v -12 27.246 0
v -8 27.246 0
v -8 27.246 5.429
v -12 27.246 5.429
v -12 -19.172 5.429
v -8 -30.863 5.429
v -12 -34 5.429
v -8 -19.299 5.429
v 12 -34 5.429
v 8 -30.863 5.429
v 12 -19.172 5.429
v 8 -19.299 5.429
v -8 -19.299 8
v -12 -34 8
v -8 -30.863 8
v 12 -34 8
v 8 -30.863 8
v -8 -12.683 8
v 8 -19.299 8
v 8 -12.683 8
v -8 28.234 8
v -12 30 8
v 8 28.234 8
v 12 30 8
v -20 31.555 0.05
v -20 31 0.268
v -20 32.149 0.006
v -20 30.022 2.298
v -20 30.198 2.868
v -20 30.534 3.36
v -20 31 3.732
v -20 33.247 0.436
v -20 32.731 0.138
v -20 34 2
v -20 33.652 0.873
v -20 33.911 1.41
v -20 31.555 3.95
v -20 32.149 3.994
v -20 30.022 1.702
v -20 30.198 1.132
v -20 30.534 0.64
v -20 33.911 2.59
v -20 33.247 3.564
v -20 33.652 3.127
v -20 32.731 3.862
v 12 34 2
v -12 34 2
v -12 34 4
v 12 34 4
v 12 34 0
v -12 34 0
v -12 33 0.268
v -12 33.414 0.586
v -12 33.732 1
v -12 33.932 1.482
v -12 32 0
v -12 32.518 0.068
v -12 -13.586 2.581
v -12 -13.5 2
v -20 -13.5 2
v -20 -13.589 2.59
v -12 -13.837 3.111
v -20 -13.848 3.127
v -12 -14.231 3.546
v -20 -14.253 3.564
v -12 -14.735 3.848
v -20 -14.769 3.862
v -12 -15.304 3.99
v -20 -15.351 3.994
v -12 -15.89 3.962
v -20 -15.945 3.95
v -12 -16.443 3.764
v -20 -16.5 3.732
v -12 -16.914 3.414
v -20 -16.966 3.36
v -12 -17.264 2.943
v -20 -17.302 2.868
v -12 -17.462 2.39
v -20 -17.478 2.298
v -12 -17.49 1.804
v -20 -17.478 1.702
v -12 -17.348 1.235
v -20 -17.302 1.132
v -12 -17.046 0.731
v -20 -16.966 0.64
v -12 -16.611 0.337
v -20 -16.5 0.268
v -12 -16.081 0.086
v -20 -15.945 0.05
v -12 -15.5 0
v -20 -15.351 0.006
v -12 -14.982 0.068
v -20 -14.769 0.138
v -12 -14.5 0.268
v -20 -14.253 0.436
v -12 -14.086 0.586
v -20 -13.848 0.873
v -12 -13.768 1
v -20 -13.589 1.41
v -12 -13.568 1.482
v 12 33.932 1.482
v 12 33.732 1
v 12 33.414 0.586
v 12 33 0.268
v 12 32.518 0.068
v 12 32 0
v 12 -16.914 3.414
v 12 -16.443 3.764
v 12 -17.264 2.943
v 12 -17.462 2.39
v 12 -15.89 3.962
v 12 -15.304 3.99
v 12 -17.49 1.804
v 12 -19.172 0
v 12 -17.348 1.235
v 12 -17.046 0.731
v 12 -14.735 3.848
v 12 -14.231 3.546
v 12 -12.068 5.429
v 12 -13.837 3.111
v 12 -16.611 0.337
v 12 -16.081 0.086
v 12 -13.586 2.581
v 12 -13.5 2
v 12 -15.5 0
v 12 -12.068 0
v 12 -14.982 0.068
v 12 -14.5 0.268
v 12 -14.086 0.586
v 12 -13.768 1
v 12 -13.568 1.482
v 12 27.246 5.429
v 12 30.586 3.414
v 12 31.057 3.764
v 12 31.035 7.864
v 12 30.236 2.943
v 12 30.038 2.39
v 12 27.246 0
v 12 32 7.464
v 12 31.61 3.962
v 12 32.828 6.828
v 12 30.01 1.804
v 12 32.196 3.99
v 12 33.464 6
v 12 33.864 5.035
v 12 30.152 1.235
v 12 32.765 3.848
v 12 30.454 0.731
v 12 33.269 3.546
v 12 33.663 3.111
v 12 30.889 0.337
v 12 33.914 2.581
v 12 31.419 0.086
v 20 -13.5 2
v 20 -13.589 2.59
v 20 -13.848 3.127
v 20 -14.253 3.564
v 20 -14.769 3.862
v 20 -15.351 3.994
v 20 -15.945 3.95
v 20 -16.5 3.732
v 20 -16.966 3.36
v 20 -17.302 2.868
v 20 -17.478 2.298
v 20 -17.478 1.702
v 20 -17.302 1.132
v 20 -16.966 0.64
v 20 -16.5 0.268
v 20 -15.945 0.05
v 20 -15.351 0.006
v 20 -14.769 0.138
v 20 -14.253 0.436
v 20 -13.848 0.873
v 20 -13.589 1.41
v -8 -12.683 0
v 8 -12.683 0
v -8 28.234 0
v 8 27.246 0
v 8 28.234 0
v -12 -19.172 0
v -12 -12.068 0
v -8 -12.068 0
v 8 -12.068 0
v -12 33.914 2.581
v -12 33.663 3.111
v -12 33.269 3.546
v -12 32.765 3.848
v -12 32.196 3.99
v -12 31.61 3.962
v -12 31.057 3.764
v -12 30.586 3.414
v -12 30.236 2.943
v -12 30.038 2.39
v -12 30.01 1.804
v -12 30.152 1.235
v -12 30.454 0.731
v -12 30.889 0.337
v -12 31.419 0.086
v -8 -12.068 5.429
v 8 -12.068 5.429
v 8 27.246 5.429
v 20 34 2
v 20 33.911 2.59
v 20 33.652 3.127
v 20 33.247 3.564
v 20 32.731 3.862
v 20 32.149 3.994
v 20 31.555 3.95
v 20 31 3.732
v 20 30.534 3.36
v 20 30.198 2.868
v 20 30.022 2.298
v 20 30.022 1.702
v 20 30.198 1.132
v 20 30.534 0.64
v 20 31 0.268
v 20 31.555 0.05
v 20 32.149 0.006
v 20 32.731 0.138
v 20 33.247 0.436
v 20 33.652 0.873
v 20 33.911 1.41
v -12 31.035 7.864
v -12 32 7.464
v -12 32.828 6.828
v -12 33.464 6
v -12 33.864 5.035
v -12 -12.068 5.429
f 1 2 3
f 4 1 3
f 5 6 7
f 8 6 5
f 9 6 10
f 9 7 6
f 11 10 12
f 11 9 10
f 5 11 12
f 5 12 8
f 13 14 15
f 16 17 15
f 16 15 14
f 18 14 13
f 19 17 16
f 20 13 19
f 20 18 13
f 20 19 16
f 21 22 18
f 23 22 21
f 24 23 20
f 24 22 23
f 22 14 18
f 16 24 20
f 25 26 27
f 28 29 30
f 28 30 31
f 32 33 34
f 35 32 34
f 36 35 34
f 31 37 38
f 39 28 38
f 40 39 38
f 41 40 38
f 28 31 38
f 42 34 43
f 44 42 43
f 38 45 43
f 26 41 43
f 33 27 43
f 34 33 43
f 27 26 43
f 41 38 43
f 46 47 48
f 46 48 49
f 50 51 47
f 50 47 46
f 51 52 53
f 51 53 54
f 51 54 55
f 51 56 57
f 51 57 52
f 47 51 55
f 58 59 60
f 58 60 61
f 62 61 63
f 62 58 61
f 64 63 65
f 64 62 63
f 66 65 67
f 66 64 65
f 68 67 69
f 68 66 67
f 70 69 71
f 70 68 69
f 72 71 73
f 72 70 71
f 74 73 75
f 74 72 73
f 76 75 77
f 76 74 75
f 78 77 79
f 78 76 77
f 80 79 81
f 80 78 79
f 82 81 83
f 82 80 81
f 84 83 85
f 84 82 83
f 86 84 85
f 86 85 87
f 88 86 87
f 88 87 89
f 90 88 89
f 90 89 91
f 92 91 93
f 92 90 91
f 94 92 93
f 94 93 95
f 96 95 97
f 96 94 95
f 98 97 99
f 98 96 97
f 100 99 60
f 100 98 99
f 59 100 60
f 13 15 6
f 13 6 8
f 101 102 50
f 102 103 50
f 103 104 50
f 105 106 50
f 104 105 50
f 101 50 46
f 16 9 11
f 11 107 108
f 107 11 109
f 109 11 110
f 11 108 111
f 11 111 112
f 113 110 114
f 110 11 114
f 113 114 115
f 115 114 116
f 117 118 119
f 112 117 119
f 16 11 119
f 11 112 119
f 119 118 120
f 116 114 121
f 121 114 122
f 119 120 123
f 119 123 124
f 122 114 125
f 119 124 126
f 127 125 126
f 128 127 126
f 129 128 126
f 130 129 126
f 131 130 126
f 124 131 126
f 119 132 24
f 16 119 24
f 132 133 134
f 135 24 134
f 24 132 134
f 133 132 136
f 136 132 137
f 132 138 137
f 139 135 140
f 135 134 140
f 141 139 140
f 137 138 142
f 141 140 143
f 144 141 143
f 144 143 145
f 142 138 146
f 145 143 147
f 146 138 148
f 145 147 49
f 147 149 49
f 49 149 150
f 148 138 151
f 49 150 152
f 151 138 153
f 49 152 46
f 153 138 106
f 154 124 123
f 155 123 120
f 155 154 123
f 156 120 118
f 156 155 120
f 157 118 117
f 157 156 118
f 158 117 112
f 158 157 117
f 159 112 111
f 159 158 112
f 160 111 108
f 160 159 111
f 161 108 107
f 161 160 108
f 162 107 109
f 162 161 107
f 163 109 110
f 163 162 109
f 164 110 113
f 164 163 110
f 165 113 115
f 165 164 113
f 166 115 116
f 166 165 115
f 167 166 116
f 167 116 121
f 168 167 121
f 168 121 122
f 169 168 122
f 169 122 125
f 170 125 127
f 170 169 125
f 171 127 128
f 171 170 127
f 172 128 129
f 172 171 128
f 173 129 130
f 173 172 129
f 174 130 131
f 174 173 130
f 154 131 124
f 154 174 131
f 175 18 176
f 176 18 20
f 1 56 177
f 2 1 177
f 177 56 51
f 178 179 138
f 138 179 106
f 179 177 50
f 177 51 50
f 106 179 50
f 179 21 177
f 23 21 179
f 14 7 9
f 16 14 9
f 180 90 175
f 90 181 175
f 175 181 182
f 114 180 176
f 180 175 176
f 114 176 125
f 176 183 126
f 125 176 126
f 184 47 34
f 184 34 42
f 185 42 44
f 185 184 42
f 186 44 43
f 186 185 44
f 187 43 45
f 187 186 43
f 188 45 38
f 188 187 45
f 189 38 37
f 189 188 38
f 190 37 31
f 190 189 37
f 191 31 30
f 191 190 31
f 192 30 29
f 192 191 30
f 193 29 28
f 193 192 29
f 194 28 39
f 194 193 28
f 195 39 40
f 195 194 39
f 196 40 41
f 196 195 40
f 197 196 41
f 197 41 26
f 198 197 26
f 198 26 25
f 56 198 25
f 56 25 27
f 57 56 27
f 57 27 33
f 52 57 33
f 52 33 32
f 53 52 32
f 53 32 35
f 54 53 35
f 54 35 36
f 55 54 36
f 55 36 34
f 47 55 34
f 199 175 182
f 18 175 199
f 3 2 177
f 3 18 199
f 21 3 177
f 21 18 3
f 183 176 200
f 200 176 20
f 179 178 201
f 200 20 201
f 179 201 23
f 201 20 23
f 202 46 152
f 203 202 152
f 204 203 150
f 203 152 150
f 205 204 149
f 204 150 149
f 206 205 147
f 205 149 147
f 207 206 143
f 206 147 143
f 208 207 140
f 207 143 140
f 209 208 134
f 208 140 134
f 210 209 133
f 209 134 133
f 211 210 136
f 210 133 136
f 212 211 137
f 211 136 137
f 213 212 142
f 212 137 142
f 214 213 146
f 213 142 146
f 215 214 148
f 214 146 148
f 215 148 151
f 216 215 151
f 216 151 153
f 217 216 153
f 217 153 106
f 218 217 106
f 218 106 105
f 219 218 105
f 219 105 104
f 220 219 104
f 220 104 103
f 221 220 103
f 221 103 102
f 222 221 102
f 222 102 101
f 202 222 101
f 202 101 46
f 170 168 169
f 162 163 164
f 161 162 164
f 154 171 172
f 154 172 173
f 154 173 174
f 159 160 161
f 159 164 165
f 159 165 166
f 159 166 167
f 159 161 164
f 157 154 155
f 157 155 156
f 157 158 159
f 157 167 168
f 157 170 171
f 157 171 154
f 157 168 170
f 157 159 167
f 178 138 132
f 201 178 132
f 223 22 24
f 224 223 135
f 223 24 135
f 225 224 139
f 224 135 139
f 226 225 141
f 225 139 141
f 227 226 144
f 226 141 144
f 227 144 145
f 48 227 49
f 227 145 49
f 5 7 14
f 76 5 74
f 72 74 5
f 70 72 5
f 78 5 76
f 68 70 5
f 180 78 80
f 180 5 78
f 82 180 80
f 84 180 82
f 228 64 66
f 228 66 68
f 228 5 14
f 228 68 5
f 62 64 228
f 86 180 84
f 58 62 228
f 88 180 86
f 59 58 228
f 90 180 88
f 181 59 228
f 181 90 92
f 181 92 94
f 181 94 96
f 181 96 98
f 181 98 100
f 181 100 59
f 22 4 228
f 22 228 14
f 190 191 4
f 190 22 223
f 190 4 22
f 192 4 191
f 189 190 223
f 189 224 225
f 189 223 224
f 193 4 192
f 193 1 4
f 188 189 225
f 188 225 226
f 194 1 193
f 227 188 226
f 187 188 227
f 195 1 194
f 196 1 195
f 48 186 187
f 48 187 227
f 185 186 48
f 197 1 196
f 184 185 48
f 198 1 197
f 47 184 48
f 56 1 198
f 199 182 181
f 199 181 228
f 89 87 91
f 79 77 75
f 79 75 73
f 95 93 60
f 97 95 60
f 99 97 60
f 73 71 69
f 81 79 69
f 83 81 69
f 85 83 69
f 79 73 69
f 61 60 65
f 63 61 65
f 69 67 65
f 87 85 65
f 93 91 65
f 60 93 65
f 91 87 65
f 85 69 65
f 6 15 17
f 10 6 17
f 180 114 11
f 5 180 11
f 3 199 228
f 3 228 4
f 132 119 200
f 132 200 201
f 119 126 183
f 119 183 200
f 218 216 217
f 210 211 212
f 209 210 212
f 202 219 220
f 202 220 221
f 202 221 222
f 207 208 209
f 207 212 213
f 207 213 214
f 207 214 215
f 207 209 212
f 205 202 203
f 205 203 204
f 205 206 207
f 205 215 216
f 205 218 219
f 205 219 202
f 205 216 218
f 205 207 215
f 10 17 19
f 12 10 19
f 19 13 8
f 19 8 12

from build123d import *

# Parameters (mm, degrees)
F0_W     = 24
F0_H     = 68
F1_DEPTH = 8
F2_R     = 2
F3_DEPTH = 20
F4_W     = 39.3141321838
F4_H     = 5.4286047816
F4_W_2   = 14.8275513351
F5_DEPTH = 25
F6_W     = 16
F6_H     = 40.9167615801
F6_H_2   = 11.5639846772
F7_DEPTH = 25


with BuildPart() as f1:
    # F0 (on Top) → F1 (new body)
    with BuildSketch(Plane.XY):
        Rectangle(F0_W, F0_H)
    extrude(amount=F1_DEPTH)

    # F2 (on Right) → F3 (join, symmetric)
    with BuildSketch(Plane.YZ):
        with Locations((32, 2)):
            Circle(F2_R)
        with Locations((-15.5, 2)):
            Circle(F2_R)
    extrude(amount=F3_DEPTH, both=True)

    # F4 (on face) → F5 (cut)
    with BuildSketch(Plane.YZ.offset(12)):
        with BuildLine():
            ThreePointArc((30, 8), (32.8284271247, 6.8284271247), (34, 4))
            Line((34, 4), (34, 8))
            Line((34, 8), (30, 8))
        make_face()
        with Locations((7.5888540596, 2.7143023908)):
            Rectangle(F4_W, F4_H)
        with Locations((-26.5862243325, 2.7143023908)):
            Rectangle(F4_W_2, F4_H)
    extrude(amount=-F5_DEPTH, mode=Mode.SUBTRACT)

    # F6 (on face) → F7 (cut)
    with BuildSketch(Plane.XY.offset(8)):
        with Locations((0, 7.775218226)):
            Rectangle(F6_W, F6_H)
        with Locations((0, -25.0811139122)):
            Rectangle(F6_W, F6_H_2)
    extrude(amount=-F7_DEPTH, mode=Mode.SUBTRACT)


solid = f1.part
